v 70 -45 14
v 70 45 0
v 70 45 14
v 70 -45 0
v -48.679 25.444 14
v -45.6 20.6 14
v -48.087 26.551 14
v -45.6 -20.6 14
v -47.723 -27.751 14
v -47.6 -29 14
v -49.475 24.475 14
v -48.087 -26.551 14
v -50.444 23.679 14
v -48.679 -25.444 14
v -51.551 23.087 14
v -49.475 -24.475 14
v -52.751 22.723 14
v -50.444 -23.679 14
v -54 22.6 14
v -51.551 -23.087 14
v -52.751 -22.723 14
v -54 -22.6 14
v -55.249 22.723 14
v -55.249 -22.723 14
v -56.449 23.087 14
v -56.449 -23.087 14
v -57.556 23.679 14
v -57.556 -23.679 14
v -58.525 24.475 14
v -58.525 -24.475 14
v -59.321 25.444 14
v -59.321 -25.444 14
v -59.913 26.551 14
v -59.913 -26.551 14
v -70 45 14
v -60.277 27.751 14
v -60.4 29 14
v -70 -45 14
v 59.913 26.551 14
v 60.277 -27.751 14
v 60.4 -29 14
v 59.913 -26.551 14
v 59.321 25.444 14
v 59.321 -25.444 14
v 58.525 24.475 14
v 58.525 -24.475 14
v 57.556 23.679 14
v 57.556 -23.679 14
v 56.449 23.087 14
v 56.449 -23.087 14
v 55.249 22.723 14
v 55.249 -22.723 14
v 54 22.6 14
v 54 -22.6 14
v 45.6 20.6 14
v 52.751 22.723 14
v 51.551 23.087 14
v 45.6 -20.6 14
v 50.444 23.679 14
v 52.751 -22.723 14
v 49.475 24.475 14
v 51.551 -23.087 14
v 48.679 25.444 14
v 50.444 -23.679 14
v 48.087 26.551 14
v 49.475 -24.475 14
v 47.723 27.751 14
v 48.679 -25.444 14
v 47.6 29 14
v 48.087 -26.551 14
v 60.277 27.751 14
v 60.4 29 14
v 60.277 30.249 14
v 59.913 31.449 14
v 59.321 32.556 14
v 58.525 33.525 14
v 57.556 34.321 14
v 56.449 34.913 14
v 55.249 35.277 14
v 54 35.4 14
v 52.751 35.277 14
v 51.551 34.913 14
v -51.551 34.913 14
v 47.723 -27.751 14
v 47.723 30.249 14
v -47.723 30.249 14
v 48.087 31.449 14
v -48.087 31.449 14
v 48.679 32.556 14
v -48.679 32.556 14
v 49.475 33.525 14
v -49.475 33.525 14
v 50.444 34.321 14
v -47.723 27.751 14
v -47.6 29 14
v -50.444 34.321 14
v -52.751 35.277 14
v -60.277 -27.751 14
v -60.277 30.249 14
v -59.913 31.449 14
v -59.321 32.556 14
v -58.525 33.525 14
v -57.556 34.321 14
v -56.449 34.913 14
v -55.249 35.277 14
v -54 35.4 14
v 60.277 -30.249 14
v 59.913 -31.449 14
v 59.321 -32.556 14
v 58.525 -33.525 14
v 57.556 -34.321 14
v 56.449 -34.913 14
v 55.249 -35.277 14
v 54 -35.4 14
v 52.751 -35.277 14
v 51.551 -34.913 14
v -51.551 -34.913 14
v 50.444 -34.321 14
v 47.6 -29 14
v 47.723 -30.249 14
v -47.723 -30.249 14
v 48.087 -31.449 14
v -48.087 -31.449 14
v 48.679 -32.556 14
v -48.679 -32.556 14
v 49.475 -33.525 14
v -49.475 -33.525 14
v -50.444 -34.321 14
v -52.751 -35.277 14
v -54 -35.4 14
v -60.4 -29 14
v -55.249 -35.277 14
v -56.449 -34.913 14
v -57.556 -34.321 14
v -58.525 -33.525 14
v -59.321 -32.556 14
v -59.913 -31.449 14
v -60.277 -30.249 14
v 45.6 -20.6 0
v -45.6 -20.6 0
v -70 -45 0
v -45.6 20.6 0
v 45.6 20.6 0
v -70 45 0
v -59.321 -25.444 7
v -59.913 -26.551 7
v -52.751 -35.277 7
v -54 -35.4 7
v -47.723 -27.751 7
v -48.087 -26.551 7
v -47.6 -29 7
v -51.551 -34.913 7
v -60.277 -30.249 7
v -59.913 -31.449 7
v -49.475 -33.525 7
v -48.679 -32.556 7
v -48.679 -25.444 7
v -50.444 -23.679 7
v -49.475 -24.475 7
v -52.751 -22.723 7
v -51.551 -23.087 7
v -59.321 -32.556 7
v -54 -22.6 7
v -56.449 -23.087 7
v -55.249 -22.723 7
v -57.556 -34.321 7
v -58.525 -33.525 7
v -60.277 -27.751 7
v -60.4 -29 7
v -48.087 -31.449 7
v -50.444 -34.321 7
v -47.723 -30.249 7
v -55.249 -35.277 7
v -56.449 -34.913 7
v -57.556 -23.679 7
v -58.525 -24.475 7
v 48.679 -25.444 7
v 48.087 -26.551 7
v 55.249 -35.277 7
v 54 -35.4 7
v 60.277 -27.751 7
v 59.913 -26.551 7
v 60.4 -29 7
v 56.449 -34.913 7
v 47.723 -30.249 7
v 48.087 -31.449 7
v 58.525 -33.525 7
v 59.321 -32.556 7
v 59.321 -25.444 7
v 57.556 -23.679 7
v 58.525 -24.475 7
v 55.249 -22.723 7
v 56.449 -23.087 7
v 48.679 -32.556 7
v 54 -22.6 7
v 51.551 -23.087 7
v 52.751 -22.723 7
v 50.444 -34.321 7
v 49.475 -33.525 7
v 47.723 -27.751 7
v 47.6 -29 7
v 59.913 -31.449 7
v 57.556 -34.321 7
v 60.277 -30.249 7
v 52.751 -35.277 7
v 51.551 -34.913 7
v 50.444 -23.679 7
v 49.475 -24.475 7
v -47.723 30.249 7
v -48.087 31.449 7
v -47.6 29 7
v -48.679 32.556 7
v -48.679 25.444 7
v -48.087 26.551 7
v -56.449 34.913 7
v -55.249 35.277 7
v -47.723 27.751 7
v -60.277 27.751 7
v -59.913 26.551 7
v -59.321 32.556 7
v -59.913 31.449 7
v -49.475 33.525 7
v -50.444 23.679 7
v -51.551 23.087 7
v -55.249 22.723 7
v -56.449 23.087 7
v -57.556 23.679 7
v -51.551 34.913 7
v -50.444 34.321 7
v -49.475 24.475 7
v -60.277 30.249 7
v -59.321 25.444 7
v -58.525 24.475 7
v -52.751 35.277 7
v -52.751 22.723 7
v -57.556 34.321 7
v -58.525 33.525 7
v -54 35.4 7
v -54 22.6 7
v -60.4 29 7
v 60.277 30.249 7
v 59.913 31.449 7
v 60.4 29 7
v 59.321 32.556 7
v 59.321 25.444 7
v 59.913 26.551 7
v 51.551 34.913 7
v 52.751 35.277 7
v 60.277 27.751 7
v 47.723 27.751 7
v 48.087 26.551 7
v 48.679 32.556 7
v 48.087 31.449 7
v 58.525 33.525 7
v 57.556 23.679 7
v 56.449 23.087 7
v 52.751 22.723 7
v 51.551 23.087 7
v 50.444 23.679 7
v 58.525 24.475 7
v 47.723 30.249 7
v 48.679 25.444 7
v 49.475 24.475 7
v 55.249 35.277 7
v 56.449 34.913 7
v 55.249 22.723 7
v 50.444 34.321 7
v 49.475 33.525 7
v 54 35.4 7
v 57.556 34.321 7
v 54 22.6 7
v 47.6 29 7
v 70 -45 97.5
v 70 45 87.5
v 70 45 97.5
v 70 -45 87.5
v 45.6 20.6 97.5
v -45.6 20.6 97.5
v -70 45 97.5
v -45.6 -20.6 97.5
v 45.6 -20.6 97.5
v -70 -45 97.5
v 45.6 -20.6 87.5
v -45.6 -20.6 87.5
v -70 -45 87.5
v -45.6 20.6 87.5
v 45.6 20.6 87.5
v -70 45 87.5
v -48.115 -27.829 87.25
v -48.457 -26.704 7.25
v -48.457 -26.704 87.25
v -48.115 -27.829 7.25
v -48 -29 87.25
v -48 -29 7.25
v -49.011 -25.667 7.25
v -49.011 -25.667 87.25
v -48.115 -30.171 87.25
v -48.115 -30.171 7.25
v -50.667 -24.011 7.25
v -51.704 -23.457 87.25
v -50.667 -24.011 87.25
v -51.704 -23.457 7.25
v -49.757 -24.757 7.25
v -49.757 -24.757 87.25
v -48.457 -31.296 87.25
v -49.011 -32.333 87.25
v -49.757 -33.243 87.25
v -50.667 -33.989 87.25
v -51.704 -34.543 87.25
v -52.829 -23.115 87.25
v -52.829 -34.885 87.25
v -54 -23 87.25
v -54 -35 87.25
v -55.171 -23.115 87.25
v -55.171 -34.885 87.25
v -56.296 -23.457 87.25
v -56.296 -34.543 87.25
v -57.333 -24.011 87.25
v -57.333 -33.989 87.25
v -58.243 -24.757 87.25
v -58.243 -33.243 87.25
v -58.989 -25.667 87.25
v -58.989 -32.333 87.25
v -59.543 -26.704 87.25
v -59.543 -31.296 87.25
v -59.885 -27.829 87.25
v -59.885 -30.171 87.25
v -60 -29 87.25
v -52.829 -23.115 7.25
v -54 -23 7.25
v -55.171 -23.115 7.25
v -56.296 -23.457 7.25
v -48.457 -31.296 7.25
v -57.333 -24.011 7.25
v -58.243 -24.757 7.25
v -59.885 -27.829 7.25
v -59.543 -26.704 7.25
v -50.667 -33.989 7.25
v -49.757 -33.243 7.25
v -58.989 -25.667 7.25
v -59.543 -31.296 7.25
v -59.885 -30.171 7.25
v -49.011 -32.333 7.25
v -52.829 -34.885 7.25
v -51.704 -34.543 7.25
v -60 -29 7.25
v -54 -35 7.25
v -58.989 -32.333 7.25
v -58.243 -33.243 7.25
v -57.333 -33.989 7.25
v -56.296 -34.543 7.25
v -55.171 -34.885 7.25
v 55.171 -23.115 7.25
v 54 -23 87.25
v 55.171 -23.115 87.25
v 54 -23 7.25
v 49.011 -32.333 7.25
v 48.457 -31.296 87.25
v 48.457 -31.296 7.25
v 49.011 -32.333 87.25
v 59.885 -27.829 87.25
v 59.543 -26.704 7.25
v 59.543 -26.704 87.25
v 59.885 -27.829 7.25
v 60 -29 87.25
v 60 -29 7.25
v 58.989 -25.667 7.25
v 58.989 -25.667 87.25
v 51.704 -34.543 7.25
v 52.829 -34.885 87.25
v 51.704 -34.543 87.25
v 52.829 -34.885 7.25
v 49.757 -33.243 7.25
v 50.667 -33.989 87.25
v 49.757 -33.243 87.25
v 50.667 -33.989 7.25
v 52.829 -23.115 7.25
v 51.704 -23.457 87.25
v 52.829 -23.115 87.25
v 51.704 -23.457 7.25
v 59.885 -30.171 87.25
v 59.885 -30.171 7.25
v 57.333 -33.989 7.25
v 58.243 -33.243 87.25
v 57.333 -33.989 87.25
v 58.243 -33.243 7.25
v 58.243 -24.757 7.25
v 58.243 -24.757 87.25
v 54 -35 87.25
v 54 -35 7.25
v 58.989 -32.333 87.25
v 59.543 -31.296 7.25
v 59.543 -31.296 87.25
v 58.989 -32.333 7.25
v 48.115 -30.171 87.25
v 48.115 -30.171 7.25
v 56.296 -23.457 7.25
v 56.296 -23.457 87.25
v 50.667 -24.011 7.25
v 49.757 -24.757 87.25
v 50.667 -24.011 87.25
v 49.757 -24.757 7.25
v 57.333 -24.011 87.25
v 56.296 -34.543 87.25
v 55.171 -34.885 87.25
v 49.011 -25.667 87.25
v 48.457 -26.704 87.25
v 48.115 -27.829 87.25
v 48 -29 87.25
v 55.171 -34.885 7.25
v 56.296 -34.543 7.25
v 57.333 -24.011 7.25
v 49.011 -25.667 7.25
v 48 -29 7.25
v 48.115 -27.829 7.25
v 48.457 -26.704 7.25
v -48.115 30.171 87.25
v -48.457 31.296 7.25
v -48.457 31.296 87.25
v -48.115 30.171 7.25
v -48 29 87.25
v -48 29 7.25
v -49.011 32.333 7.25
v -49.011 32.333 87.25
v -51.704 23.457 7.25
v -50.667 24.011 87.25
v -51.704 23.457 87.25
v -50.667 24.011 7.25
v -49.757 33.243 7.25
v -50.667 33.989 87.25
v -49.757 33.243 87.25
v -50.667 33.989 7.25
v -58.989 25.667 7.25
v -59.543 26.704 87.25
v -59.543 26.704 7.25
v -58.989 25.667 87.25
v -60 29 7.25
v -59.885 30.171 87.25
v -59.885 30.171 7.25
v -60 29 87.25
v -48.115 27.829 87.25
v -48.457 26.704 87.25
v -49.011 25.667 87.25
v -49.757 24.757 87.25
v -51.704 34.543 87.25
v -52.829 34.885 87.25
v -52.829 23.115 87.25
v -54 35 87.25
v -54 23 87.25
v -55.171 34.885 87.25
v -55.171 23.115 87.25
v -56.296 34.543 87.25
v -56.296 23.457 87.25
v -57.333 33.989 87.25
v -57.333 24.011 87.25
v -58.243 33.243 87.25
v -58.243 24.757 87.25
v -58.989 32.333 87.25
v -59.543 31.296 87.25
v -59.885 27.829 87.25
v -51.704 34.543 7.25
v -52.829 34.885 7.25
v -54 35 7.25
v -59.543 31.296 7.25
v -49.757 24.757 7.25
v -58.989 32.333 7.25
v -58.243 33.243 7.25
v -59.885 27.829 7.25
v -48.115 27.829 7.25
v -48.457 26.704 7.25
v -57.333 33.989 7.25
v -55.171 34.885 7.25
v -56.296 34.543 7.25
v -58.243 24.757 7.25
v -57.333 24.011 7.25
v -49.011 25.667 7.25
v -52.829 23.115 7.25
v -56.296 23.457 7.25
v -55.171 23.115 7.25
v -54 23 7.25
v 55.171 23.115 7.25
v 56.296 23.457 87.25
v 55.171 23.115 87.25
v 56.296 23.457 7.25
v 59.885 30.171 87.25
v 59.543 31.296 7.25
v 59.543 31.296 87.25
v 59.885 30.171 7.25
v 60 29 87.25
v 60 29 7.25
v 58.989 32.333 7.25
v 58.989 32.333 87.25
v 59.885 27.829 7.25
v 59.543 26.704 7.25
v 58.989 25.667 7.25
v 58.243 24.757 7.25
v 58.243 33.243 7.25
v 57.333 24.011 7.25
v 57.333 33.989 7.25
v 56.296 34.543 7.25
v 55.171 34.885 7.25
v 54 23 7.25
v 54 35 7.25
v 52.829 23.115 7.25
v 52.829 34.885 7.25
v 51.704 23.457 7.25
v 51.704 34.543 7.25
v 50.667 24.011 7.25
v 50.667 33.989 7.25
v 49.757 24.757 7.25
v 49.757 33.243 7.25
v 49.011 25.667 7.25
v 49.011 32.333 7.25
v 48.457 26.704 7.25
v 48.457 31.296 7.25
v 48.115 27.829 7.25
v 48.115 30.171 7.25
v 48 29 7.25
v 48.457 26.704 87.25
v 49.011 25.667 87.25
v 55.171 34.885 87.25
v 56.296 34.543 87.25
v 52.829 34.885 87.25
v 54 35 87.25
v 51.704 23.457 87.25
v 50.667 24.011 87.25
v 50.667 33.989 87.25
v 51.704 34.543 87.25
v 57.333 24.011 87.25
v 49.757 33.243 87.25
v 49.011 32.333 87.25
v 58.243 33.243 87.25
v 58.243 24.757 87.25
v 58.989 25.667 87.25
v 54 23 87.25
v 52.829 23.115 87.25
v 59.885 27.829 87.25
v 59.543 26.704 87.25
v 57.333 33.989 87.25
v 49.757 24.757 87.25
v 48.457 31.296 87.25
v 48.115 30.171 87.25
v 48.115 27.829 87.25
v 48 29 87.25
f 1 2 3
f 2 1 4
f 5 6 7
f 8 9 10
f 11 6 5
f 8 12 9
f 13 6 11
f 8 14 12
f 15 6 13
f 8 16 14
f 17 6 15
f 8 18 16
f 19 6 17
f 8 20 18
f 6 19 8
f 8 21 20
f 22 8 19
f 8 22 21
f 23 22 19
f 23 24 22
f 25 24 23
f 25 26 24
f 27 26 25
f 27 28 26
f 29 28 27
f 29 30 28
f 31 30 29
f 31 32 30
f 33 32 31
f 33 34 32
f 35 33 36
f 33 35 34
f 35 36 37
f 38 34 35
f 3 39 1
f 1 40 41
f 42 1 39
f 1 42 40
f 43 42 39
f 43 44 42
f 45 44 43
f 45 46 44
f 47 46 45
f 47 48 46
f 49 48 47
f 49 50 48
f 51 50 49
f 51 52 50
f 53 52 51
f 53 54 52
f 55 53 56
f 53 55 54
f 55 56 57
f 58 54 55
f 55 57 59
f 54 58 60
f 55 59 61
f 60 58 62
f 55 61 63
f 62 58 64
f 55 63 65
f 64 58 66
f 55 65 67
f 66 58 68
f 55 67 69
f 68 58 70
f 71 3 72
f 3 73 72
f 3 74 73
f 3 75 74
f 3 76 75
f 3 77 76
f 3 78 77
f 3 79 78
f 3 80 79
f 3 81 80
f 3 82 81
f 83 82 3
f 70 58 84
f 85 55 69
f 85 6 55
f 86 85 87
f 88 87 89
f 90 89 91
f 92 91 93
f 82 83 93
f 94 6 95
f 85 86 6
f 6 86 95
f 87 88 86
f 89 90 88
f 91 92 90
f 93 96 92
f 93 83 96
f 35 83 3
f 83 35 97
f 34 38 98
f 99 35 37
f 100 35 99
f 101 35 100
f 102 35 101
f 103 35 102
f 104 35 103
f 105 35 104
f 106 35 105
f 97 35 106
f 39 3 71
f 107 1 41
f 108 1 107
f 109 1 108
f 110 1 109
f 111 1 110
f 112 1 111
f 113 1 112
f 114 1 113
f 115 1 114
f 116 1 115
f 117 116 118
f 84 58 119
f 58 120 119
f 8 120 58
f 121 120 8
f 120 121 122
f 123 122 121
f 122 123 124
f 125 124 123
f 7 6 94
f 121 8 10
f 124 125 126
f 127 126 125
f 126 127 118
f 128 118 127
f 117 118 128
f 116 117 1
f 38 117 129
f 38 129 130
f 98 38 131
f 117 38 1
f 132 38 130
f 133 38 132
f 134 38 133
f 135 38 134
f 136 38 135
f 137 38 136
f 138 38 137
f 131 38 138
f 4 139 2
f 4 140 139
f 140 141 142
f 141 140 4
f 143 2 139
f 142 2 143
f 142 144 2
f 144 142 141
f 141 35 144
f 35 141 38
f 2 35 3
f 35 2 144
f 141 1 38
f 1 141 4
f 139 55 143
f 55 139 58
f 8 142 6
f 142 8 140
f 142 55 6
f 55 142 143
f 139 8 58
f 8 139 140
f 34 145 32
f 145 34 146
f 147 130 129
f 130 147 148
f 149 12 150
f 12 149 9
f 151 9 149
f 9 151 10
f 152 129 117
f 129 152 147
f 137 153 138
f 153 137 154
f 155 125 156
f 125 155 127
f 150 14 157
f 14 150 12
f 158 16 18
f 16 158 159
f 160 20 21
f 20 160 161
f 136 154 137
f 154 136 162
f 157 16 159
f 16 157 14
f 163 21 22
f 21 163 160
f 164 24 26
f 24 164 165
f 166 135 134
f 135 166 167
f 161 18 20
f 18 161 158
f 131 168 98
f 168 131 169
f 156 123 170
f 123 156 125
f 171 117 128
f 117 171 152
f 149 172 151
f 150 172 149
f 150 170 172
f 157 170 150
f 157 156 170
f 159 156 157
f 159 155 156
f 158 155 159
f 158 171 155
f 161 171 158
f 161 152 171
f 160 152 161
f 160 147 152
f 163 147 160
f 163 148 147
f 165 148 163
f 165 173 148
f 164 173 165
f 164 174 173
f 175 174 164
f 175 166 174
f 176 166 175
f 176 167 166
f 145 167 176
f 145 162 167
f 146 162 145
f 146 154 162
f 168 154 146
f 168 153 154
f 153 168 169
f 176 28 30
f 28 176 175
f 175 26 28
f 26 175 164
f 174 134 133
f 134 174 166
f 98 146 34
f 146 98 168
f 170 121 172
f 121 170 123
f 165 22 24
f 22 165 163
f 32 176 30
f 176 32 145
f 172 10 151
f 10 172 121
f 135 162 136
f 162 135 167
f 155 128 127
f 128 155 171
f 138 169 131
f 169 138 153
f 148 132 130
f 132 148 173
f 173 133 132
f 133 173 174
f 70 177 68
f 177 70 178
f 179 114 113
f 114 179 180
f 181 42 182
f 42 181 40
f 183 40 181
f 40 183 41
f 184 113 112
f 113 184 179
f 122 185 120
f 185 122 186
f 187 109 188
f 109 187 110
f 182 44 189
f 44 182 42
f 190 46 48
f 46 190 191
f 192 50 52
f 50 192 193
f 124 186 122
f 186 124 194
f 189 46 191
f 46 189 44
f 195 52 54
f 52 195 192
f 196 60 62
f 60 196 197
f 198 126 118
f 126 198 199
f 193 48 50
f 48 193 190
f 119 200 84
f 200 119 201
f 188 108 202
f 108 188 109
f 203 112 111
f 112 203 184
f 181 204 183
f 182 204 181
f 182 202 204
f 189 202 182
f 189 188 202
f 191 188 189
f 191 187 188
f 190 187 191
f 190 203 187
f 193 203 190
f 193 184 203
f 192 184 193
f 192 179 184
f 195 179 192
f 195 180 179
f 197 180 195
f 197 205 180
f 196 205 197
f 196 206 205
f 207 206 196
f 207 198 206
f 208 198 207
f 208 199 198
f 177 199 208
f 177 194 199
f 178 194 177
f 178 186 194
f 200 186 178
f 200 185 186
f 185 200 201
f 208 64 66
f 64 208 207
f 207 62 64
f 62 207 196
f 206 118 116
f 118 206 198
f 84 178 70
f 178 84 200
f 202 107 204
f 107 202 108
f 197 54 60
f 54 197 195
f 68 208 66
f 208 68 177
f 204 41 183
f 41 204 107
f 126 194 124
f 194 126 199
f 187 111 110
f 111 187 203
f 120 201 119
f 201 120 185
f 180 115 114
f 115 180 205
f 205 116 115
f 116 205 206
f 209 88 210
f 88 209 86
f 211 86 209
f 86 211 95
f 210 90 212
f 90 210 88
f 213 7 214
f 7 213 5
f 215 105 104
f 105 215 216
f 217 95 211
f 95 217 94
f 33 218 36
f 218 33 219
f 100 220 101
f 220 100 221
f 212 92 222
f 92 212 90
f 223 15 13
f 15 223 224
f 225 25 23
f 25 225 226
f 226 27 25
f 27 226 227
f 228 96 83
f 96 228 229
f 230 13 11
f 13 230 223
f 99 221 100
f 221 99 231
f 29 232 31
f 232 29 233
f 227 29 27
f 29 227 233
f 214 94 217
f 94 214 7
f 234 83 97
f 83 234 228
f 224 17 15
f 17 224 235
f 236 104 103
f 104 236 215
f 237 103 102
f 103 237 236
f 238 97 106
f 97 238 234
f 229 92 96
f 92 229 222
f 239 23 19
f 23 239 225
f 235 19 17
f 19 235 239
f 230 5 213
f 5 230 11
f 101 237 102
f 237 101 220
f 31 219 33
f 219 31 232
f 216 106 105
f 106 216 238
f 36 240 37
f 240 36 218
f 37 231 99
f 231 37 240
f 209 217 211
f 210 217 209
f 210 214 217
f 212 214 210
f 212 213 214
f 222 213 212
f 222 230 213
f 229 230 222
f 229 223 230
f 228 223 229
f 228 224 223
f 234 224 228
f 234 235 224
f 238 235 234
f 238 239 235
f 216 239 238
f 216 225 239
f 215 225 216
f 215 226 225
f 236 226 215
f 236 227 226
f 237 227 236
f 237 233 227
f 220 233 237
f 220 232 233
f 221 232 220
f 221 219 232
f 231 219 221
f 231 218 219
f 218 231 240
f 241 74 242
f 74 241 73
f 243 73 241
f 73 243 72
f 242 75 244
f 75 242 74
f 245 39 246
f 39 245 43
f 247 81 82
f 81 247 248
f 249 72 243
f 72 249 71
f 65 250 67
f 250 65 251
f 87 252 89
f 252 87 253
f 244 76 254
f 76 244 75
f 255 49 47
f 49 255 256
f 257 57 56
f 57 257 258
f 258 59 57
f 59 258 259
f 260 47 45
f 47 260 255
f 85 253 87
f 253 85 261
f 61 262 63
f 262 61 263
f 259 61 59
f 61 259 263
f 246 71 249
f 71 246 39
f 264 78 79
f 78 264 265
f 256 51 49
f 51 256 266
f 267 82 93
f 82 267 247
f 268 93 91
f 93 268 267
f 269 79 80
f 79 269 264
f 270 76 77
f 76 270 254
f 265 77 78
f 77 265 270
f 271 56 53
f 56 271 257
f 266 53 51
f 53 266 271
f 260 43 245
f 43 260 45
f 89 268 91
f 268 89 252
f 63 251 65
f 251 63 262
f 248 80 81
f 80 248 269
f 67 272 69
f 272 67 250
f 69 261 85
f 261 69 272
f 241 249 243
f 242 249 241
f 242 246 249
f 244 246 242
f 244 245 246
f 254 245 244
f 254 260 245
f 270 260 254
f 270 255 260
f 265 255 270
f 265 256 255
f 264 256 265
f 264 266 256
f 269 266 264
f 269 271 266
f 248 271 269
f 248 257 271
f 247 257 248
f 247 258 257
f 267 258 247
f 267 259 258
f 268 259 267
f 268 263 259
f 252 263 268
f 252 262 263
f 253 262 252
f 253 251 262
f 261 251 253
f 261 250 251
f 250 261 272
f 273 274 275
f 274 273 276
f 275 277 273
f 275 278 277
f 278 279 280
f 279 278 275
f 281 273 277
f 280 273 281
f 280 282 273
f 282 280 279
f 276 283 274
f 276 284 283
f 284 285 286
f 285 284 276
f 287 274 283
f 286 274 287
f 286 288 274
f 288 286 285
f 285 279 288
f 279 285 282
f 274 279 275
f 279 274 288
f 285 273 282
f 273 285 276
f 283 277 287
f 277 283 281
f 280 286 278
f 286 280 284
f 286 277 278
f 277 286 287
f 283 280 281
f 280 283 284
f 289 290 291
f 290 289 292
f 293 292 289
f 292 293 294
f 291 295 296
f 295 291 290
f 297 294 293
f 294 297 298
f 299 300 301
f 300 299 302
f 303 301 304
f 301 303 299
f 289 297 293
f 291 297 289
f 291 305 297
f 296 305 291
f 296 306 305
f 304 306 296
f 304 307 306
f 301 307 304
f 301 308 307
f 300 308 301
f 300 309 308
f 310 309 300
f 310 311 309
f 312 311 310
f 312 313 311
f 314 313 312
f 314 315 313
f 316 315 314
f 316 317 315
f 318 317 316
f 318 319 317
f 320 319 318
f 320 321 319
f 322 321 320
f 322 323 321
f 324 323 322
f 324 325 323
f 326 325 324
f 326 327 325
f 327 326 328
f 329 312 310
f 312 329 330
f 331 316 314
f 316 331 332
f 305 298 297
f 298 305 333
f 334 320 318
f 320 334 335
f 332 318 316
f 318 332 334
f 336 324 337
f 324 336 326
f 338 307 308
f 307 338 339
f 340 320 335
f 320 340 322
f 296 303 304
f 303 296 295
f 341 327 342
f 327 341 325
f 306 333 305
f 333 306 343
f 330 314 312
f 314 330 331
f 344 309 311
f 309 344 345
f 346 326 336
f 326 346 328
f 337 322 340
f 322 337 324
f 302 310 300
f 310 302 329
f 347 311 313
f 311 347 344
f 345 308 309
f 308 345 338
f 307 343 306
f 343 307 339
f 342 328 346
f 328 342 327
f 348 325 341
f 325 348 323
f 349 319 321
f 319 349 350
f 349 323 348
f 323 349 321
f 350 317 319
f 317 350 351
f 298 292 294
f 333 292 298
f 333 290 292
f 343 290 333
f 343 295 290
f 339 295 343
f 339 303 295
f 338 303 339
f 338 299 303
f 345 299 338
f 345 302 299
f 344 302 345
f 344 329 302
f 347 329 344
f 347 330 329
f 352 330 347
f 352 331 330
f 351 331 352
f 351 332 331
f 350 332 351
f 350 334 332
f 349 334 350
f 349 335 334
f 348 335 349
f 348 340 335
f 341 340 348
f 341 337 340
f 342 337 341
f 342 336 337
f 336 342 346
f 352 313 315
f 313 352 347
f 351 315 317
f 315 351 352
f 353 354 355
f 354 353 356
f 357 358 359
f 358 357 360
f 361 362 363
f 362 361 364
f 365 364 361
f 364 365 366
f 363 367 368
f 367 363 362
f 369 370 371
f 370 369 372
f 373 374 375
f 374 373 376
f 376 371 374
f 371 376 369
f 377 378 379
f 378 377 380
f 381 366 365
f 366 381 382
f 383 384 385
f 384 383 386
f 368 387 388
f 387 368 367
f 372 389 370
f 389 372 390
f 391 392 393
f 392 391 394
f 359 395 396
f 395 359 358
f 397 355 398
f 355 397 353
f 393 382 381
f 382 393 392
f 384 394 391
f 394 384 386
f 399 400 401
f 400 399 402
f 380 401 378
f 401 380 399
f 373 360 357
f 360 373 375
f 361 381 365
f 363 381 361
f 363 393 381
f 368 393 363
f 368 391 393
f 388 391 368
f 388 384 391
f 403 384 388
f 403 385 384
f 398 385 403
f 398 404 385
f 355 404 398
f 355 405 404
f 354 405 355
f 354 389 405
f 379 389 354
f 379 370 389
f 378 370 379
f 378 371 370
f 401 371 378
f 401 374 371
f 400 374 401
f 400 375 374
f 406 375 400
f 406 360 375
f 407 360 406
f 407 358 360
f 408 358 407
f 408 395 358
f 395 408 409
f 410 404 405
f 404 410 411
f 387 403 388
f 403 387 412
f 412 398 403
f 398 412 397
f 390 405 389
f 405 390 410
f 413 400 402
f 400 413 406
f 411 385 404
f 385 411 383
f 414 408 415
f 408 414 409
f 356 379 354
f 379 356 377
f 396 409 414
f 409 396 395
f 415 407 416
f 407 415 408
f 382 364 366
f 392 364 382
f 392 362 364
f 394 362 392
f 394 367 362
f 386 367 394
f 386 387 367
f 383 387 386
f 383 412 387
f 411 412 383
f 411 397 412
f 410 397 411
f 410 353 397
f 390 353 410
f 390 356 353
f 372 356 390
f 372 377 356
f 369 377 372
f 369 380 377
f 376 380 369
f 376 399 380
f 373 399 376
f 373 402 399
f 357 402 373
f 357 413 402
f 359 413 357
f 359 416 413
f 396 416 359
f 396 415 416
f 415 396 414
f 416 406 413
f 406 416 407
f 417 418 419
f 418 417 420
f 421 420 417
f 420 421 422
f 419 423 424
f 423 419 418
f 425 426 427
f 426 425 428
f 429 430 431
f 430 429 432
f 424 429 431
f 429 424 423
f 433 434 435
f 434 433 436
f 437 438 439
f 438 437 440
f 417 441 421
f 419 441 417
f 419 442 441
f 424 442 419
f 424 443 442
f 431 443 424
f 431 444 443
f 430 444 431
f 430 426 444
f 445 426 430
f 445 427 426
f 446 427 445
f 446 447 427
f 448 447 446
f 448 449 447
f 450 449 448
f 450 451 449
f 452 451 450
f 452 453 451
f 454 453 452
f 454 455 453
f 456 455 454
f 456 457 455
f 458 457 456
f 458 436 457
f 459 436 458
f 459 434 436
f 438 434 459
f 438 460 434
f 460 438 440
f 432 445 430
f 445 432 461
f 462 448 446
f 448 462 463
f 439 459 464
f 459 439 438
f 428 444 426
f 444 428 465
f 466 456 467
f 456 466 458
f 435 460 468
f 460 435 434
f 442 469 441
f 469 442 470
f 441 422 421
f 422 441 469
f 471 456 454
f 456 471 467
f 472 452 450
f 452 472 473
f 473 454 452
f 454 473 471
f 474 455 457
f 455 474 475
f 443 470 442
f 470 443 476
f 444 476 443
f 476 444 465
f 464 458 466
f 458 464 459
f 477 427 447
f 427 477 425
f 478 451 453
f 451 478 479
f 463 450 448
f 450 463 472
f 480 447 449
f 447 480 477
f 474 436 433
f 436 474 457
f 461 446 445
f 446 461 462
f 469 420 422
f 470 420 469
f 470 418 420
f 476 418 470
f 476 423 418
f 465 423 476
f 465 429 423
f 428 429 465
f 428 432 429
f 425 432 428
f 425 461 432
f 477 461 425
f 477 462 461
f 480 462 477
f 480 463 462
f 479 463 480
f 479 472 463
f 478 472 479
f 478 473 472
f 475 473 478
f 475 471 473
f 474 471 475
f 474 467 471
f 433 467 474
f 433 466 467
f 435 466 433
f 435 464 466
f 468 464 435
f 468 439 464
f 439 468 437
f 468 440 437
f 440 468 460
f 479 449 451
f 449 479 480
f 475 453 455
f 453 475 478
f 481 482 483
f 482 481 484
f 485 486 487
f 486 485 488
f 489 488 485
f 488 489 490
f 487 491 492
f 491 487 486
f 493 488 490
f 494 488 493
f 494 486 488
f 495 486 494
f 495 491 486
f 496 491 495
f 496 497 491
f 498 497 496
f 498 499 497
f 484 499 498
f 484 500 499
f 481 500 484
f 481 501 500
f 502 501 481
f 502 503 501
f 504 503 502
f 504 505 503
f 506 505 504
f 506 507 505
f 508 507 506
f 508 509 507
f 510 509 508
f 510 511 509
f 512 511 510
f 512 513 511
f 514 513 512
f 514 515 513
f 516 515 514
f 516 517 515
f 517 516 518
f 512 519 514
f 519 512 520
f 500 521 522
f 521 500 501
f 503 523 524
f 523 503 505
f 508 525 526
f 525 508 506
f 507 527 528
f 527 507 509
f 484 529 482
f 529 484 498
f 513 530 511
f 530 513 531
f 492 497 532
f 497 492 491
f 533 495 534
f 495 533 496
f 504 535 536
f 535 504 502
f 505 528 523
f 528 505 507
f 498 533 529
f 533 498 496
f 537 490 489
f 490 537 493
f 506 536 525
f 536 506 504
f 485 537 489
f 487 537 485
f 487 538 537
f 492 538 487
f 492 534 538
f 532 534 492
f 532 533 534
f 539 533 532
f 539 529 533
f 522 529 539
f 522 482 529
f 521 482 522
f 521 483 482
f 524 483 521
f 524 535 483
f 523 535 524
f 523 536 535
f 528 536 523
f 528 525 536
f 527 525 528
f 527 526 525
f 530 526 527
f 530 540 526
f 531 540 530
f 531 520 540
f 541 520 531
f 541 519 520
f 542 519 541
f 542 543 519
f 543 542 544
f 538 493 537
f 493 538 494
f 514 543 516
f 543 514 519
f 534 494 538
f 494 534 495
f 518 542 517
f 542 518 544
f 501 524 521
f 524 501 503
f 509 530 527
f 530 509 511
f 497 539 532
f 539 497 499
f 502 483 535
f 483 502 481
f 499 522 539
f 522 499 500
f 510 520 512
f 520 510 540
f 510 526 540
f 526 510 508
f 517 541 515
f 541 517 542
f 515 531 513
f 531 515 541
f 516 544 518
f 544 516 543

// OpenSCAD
$fn = 32;

// ------------------------------------------------------------------------
// Frame cube: base 140 x 90 mm, posts 80 mm tall
// Every part is its own module, assembly() places every instance.
// ------------------------------------------------------------------------

// --- part 1 ---
module base_frame() {
  difference() {
    translate([-70, -45, 0]) cube([140, 90, 14]);
    translate([-45.6, -20.6, -1]) cube([91.2, 41.2, 16]);
    translate([-54, -29, 7]) cylinder(h = 8, d = 12.8);
    translate([54, -29, 7]) cylinder(h = 8, d = 12.8);
    translate([-54, 29, 7]) cylinder(h = 8, d = 12.8);
    translate([54, 29, 7]) cylinder(h = 8, d = 12.8);
  }
}

// --- part 2 ---
module corner_post() {
  cylinder(h = 80, d = 12);
}

// --- part 3 ---
module top_frame() {
  difference() {
    translate([-70, -45, 0]) cube([140, 90, 10]);
    translate([-45.6, -20.6, -1]) cube([91.2, 41.2, 12]);
  }
}

// --- assembly ---
module assembly() {
  color([0.80, 0.24, 0.20]) translate([0, 0, 0]) rotate([0, 0, 0]) base_frame();
  color([0.20, 0.45, 0.75]) translate([-54, -29, 7.25]) rotate([0, 0, 0]) corner_post();
  color([0.25, 0.62, 0.32]) translate([54, -29, 7.25]) rotate([0, 0, 0]) corner_post();
  color([0.92, 0.70, 0.18]) translate([-54, 29, 7.25]) rotate([0, 0, 0]) corner_post();
  color([0.58, 0.35, 0.70]) translate([54, 29, 7.25]) rotate([0, 0, 0]) corner_post();
  color([0.16, 0.66, 0.66]) translate([0, 0, 87.5]) rotate([0, 0, 0]) top_frame();
}

assembly();
